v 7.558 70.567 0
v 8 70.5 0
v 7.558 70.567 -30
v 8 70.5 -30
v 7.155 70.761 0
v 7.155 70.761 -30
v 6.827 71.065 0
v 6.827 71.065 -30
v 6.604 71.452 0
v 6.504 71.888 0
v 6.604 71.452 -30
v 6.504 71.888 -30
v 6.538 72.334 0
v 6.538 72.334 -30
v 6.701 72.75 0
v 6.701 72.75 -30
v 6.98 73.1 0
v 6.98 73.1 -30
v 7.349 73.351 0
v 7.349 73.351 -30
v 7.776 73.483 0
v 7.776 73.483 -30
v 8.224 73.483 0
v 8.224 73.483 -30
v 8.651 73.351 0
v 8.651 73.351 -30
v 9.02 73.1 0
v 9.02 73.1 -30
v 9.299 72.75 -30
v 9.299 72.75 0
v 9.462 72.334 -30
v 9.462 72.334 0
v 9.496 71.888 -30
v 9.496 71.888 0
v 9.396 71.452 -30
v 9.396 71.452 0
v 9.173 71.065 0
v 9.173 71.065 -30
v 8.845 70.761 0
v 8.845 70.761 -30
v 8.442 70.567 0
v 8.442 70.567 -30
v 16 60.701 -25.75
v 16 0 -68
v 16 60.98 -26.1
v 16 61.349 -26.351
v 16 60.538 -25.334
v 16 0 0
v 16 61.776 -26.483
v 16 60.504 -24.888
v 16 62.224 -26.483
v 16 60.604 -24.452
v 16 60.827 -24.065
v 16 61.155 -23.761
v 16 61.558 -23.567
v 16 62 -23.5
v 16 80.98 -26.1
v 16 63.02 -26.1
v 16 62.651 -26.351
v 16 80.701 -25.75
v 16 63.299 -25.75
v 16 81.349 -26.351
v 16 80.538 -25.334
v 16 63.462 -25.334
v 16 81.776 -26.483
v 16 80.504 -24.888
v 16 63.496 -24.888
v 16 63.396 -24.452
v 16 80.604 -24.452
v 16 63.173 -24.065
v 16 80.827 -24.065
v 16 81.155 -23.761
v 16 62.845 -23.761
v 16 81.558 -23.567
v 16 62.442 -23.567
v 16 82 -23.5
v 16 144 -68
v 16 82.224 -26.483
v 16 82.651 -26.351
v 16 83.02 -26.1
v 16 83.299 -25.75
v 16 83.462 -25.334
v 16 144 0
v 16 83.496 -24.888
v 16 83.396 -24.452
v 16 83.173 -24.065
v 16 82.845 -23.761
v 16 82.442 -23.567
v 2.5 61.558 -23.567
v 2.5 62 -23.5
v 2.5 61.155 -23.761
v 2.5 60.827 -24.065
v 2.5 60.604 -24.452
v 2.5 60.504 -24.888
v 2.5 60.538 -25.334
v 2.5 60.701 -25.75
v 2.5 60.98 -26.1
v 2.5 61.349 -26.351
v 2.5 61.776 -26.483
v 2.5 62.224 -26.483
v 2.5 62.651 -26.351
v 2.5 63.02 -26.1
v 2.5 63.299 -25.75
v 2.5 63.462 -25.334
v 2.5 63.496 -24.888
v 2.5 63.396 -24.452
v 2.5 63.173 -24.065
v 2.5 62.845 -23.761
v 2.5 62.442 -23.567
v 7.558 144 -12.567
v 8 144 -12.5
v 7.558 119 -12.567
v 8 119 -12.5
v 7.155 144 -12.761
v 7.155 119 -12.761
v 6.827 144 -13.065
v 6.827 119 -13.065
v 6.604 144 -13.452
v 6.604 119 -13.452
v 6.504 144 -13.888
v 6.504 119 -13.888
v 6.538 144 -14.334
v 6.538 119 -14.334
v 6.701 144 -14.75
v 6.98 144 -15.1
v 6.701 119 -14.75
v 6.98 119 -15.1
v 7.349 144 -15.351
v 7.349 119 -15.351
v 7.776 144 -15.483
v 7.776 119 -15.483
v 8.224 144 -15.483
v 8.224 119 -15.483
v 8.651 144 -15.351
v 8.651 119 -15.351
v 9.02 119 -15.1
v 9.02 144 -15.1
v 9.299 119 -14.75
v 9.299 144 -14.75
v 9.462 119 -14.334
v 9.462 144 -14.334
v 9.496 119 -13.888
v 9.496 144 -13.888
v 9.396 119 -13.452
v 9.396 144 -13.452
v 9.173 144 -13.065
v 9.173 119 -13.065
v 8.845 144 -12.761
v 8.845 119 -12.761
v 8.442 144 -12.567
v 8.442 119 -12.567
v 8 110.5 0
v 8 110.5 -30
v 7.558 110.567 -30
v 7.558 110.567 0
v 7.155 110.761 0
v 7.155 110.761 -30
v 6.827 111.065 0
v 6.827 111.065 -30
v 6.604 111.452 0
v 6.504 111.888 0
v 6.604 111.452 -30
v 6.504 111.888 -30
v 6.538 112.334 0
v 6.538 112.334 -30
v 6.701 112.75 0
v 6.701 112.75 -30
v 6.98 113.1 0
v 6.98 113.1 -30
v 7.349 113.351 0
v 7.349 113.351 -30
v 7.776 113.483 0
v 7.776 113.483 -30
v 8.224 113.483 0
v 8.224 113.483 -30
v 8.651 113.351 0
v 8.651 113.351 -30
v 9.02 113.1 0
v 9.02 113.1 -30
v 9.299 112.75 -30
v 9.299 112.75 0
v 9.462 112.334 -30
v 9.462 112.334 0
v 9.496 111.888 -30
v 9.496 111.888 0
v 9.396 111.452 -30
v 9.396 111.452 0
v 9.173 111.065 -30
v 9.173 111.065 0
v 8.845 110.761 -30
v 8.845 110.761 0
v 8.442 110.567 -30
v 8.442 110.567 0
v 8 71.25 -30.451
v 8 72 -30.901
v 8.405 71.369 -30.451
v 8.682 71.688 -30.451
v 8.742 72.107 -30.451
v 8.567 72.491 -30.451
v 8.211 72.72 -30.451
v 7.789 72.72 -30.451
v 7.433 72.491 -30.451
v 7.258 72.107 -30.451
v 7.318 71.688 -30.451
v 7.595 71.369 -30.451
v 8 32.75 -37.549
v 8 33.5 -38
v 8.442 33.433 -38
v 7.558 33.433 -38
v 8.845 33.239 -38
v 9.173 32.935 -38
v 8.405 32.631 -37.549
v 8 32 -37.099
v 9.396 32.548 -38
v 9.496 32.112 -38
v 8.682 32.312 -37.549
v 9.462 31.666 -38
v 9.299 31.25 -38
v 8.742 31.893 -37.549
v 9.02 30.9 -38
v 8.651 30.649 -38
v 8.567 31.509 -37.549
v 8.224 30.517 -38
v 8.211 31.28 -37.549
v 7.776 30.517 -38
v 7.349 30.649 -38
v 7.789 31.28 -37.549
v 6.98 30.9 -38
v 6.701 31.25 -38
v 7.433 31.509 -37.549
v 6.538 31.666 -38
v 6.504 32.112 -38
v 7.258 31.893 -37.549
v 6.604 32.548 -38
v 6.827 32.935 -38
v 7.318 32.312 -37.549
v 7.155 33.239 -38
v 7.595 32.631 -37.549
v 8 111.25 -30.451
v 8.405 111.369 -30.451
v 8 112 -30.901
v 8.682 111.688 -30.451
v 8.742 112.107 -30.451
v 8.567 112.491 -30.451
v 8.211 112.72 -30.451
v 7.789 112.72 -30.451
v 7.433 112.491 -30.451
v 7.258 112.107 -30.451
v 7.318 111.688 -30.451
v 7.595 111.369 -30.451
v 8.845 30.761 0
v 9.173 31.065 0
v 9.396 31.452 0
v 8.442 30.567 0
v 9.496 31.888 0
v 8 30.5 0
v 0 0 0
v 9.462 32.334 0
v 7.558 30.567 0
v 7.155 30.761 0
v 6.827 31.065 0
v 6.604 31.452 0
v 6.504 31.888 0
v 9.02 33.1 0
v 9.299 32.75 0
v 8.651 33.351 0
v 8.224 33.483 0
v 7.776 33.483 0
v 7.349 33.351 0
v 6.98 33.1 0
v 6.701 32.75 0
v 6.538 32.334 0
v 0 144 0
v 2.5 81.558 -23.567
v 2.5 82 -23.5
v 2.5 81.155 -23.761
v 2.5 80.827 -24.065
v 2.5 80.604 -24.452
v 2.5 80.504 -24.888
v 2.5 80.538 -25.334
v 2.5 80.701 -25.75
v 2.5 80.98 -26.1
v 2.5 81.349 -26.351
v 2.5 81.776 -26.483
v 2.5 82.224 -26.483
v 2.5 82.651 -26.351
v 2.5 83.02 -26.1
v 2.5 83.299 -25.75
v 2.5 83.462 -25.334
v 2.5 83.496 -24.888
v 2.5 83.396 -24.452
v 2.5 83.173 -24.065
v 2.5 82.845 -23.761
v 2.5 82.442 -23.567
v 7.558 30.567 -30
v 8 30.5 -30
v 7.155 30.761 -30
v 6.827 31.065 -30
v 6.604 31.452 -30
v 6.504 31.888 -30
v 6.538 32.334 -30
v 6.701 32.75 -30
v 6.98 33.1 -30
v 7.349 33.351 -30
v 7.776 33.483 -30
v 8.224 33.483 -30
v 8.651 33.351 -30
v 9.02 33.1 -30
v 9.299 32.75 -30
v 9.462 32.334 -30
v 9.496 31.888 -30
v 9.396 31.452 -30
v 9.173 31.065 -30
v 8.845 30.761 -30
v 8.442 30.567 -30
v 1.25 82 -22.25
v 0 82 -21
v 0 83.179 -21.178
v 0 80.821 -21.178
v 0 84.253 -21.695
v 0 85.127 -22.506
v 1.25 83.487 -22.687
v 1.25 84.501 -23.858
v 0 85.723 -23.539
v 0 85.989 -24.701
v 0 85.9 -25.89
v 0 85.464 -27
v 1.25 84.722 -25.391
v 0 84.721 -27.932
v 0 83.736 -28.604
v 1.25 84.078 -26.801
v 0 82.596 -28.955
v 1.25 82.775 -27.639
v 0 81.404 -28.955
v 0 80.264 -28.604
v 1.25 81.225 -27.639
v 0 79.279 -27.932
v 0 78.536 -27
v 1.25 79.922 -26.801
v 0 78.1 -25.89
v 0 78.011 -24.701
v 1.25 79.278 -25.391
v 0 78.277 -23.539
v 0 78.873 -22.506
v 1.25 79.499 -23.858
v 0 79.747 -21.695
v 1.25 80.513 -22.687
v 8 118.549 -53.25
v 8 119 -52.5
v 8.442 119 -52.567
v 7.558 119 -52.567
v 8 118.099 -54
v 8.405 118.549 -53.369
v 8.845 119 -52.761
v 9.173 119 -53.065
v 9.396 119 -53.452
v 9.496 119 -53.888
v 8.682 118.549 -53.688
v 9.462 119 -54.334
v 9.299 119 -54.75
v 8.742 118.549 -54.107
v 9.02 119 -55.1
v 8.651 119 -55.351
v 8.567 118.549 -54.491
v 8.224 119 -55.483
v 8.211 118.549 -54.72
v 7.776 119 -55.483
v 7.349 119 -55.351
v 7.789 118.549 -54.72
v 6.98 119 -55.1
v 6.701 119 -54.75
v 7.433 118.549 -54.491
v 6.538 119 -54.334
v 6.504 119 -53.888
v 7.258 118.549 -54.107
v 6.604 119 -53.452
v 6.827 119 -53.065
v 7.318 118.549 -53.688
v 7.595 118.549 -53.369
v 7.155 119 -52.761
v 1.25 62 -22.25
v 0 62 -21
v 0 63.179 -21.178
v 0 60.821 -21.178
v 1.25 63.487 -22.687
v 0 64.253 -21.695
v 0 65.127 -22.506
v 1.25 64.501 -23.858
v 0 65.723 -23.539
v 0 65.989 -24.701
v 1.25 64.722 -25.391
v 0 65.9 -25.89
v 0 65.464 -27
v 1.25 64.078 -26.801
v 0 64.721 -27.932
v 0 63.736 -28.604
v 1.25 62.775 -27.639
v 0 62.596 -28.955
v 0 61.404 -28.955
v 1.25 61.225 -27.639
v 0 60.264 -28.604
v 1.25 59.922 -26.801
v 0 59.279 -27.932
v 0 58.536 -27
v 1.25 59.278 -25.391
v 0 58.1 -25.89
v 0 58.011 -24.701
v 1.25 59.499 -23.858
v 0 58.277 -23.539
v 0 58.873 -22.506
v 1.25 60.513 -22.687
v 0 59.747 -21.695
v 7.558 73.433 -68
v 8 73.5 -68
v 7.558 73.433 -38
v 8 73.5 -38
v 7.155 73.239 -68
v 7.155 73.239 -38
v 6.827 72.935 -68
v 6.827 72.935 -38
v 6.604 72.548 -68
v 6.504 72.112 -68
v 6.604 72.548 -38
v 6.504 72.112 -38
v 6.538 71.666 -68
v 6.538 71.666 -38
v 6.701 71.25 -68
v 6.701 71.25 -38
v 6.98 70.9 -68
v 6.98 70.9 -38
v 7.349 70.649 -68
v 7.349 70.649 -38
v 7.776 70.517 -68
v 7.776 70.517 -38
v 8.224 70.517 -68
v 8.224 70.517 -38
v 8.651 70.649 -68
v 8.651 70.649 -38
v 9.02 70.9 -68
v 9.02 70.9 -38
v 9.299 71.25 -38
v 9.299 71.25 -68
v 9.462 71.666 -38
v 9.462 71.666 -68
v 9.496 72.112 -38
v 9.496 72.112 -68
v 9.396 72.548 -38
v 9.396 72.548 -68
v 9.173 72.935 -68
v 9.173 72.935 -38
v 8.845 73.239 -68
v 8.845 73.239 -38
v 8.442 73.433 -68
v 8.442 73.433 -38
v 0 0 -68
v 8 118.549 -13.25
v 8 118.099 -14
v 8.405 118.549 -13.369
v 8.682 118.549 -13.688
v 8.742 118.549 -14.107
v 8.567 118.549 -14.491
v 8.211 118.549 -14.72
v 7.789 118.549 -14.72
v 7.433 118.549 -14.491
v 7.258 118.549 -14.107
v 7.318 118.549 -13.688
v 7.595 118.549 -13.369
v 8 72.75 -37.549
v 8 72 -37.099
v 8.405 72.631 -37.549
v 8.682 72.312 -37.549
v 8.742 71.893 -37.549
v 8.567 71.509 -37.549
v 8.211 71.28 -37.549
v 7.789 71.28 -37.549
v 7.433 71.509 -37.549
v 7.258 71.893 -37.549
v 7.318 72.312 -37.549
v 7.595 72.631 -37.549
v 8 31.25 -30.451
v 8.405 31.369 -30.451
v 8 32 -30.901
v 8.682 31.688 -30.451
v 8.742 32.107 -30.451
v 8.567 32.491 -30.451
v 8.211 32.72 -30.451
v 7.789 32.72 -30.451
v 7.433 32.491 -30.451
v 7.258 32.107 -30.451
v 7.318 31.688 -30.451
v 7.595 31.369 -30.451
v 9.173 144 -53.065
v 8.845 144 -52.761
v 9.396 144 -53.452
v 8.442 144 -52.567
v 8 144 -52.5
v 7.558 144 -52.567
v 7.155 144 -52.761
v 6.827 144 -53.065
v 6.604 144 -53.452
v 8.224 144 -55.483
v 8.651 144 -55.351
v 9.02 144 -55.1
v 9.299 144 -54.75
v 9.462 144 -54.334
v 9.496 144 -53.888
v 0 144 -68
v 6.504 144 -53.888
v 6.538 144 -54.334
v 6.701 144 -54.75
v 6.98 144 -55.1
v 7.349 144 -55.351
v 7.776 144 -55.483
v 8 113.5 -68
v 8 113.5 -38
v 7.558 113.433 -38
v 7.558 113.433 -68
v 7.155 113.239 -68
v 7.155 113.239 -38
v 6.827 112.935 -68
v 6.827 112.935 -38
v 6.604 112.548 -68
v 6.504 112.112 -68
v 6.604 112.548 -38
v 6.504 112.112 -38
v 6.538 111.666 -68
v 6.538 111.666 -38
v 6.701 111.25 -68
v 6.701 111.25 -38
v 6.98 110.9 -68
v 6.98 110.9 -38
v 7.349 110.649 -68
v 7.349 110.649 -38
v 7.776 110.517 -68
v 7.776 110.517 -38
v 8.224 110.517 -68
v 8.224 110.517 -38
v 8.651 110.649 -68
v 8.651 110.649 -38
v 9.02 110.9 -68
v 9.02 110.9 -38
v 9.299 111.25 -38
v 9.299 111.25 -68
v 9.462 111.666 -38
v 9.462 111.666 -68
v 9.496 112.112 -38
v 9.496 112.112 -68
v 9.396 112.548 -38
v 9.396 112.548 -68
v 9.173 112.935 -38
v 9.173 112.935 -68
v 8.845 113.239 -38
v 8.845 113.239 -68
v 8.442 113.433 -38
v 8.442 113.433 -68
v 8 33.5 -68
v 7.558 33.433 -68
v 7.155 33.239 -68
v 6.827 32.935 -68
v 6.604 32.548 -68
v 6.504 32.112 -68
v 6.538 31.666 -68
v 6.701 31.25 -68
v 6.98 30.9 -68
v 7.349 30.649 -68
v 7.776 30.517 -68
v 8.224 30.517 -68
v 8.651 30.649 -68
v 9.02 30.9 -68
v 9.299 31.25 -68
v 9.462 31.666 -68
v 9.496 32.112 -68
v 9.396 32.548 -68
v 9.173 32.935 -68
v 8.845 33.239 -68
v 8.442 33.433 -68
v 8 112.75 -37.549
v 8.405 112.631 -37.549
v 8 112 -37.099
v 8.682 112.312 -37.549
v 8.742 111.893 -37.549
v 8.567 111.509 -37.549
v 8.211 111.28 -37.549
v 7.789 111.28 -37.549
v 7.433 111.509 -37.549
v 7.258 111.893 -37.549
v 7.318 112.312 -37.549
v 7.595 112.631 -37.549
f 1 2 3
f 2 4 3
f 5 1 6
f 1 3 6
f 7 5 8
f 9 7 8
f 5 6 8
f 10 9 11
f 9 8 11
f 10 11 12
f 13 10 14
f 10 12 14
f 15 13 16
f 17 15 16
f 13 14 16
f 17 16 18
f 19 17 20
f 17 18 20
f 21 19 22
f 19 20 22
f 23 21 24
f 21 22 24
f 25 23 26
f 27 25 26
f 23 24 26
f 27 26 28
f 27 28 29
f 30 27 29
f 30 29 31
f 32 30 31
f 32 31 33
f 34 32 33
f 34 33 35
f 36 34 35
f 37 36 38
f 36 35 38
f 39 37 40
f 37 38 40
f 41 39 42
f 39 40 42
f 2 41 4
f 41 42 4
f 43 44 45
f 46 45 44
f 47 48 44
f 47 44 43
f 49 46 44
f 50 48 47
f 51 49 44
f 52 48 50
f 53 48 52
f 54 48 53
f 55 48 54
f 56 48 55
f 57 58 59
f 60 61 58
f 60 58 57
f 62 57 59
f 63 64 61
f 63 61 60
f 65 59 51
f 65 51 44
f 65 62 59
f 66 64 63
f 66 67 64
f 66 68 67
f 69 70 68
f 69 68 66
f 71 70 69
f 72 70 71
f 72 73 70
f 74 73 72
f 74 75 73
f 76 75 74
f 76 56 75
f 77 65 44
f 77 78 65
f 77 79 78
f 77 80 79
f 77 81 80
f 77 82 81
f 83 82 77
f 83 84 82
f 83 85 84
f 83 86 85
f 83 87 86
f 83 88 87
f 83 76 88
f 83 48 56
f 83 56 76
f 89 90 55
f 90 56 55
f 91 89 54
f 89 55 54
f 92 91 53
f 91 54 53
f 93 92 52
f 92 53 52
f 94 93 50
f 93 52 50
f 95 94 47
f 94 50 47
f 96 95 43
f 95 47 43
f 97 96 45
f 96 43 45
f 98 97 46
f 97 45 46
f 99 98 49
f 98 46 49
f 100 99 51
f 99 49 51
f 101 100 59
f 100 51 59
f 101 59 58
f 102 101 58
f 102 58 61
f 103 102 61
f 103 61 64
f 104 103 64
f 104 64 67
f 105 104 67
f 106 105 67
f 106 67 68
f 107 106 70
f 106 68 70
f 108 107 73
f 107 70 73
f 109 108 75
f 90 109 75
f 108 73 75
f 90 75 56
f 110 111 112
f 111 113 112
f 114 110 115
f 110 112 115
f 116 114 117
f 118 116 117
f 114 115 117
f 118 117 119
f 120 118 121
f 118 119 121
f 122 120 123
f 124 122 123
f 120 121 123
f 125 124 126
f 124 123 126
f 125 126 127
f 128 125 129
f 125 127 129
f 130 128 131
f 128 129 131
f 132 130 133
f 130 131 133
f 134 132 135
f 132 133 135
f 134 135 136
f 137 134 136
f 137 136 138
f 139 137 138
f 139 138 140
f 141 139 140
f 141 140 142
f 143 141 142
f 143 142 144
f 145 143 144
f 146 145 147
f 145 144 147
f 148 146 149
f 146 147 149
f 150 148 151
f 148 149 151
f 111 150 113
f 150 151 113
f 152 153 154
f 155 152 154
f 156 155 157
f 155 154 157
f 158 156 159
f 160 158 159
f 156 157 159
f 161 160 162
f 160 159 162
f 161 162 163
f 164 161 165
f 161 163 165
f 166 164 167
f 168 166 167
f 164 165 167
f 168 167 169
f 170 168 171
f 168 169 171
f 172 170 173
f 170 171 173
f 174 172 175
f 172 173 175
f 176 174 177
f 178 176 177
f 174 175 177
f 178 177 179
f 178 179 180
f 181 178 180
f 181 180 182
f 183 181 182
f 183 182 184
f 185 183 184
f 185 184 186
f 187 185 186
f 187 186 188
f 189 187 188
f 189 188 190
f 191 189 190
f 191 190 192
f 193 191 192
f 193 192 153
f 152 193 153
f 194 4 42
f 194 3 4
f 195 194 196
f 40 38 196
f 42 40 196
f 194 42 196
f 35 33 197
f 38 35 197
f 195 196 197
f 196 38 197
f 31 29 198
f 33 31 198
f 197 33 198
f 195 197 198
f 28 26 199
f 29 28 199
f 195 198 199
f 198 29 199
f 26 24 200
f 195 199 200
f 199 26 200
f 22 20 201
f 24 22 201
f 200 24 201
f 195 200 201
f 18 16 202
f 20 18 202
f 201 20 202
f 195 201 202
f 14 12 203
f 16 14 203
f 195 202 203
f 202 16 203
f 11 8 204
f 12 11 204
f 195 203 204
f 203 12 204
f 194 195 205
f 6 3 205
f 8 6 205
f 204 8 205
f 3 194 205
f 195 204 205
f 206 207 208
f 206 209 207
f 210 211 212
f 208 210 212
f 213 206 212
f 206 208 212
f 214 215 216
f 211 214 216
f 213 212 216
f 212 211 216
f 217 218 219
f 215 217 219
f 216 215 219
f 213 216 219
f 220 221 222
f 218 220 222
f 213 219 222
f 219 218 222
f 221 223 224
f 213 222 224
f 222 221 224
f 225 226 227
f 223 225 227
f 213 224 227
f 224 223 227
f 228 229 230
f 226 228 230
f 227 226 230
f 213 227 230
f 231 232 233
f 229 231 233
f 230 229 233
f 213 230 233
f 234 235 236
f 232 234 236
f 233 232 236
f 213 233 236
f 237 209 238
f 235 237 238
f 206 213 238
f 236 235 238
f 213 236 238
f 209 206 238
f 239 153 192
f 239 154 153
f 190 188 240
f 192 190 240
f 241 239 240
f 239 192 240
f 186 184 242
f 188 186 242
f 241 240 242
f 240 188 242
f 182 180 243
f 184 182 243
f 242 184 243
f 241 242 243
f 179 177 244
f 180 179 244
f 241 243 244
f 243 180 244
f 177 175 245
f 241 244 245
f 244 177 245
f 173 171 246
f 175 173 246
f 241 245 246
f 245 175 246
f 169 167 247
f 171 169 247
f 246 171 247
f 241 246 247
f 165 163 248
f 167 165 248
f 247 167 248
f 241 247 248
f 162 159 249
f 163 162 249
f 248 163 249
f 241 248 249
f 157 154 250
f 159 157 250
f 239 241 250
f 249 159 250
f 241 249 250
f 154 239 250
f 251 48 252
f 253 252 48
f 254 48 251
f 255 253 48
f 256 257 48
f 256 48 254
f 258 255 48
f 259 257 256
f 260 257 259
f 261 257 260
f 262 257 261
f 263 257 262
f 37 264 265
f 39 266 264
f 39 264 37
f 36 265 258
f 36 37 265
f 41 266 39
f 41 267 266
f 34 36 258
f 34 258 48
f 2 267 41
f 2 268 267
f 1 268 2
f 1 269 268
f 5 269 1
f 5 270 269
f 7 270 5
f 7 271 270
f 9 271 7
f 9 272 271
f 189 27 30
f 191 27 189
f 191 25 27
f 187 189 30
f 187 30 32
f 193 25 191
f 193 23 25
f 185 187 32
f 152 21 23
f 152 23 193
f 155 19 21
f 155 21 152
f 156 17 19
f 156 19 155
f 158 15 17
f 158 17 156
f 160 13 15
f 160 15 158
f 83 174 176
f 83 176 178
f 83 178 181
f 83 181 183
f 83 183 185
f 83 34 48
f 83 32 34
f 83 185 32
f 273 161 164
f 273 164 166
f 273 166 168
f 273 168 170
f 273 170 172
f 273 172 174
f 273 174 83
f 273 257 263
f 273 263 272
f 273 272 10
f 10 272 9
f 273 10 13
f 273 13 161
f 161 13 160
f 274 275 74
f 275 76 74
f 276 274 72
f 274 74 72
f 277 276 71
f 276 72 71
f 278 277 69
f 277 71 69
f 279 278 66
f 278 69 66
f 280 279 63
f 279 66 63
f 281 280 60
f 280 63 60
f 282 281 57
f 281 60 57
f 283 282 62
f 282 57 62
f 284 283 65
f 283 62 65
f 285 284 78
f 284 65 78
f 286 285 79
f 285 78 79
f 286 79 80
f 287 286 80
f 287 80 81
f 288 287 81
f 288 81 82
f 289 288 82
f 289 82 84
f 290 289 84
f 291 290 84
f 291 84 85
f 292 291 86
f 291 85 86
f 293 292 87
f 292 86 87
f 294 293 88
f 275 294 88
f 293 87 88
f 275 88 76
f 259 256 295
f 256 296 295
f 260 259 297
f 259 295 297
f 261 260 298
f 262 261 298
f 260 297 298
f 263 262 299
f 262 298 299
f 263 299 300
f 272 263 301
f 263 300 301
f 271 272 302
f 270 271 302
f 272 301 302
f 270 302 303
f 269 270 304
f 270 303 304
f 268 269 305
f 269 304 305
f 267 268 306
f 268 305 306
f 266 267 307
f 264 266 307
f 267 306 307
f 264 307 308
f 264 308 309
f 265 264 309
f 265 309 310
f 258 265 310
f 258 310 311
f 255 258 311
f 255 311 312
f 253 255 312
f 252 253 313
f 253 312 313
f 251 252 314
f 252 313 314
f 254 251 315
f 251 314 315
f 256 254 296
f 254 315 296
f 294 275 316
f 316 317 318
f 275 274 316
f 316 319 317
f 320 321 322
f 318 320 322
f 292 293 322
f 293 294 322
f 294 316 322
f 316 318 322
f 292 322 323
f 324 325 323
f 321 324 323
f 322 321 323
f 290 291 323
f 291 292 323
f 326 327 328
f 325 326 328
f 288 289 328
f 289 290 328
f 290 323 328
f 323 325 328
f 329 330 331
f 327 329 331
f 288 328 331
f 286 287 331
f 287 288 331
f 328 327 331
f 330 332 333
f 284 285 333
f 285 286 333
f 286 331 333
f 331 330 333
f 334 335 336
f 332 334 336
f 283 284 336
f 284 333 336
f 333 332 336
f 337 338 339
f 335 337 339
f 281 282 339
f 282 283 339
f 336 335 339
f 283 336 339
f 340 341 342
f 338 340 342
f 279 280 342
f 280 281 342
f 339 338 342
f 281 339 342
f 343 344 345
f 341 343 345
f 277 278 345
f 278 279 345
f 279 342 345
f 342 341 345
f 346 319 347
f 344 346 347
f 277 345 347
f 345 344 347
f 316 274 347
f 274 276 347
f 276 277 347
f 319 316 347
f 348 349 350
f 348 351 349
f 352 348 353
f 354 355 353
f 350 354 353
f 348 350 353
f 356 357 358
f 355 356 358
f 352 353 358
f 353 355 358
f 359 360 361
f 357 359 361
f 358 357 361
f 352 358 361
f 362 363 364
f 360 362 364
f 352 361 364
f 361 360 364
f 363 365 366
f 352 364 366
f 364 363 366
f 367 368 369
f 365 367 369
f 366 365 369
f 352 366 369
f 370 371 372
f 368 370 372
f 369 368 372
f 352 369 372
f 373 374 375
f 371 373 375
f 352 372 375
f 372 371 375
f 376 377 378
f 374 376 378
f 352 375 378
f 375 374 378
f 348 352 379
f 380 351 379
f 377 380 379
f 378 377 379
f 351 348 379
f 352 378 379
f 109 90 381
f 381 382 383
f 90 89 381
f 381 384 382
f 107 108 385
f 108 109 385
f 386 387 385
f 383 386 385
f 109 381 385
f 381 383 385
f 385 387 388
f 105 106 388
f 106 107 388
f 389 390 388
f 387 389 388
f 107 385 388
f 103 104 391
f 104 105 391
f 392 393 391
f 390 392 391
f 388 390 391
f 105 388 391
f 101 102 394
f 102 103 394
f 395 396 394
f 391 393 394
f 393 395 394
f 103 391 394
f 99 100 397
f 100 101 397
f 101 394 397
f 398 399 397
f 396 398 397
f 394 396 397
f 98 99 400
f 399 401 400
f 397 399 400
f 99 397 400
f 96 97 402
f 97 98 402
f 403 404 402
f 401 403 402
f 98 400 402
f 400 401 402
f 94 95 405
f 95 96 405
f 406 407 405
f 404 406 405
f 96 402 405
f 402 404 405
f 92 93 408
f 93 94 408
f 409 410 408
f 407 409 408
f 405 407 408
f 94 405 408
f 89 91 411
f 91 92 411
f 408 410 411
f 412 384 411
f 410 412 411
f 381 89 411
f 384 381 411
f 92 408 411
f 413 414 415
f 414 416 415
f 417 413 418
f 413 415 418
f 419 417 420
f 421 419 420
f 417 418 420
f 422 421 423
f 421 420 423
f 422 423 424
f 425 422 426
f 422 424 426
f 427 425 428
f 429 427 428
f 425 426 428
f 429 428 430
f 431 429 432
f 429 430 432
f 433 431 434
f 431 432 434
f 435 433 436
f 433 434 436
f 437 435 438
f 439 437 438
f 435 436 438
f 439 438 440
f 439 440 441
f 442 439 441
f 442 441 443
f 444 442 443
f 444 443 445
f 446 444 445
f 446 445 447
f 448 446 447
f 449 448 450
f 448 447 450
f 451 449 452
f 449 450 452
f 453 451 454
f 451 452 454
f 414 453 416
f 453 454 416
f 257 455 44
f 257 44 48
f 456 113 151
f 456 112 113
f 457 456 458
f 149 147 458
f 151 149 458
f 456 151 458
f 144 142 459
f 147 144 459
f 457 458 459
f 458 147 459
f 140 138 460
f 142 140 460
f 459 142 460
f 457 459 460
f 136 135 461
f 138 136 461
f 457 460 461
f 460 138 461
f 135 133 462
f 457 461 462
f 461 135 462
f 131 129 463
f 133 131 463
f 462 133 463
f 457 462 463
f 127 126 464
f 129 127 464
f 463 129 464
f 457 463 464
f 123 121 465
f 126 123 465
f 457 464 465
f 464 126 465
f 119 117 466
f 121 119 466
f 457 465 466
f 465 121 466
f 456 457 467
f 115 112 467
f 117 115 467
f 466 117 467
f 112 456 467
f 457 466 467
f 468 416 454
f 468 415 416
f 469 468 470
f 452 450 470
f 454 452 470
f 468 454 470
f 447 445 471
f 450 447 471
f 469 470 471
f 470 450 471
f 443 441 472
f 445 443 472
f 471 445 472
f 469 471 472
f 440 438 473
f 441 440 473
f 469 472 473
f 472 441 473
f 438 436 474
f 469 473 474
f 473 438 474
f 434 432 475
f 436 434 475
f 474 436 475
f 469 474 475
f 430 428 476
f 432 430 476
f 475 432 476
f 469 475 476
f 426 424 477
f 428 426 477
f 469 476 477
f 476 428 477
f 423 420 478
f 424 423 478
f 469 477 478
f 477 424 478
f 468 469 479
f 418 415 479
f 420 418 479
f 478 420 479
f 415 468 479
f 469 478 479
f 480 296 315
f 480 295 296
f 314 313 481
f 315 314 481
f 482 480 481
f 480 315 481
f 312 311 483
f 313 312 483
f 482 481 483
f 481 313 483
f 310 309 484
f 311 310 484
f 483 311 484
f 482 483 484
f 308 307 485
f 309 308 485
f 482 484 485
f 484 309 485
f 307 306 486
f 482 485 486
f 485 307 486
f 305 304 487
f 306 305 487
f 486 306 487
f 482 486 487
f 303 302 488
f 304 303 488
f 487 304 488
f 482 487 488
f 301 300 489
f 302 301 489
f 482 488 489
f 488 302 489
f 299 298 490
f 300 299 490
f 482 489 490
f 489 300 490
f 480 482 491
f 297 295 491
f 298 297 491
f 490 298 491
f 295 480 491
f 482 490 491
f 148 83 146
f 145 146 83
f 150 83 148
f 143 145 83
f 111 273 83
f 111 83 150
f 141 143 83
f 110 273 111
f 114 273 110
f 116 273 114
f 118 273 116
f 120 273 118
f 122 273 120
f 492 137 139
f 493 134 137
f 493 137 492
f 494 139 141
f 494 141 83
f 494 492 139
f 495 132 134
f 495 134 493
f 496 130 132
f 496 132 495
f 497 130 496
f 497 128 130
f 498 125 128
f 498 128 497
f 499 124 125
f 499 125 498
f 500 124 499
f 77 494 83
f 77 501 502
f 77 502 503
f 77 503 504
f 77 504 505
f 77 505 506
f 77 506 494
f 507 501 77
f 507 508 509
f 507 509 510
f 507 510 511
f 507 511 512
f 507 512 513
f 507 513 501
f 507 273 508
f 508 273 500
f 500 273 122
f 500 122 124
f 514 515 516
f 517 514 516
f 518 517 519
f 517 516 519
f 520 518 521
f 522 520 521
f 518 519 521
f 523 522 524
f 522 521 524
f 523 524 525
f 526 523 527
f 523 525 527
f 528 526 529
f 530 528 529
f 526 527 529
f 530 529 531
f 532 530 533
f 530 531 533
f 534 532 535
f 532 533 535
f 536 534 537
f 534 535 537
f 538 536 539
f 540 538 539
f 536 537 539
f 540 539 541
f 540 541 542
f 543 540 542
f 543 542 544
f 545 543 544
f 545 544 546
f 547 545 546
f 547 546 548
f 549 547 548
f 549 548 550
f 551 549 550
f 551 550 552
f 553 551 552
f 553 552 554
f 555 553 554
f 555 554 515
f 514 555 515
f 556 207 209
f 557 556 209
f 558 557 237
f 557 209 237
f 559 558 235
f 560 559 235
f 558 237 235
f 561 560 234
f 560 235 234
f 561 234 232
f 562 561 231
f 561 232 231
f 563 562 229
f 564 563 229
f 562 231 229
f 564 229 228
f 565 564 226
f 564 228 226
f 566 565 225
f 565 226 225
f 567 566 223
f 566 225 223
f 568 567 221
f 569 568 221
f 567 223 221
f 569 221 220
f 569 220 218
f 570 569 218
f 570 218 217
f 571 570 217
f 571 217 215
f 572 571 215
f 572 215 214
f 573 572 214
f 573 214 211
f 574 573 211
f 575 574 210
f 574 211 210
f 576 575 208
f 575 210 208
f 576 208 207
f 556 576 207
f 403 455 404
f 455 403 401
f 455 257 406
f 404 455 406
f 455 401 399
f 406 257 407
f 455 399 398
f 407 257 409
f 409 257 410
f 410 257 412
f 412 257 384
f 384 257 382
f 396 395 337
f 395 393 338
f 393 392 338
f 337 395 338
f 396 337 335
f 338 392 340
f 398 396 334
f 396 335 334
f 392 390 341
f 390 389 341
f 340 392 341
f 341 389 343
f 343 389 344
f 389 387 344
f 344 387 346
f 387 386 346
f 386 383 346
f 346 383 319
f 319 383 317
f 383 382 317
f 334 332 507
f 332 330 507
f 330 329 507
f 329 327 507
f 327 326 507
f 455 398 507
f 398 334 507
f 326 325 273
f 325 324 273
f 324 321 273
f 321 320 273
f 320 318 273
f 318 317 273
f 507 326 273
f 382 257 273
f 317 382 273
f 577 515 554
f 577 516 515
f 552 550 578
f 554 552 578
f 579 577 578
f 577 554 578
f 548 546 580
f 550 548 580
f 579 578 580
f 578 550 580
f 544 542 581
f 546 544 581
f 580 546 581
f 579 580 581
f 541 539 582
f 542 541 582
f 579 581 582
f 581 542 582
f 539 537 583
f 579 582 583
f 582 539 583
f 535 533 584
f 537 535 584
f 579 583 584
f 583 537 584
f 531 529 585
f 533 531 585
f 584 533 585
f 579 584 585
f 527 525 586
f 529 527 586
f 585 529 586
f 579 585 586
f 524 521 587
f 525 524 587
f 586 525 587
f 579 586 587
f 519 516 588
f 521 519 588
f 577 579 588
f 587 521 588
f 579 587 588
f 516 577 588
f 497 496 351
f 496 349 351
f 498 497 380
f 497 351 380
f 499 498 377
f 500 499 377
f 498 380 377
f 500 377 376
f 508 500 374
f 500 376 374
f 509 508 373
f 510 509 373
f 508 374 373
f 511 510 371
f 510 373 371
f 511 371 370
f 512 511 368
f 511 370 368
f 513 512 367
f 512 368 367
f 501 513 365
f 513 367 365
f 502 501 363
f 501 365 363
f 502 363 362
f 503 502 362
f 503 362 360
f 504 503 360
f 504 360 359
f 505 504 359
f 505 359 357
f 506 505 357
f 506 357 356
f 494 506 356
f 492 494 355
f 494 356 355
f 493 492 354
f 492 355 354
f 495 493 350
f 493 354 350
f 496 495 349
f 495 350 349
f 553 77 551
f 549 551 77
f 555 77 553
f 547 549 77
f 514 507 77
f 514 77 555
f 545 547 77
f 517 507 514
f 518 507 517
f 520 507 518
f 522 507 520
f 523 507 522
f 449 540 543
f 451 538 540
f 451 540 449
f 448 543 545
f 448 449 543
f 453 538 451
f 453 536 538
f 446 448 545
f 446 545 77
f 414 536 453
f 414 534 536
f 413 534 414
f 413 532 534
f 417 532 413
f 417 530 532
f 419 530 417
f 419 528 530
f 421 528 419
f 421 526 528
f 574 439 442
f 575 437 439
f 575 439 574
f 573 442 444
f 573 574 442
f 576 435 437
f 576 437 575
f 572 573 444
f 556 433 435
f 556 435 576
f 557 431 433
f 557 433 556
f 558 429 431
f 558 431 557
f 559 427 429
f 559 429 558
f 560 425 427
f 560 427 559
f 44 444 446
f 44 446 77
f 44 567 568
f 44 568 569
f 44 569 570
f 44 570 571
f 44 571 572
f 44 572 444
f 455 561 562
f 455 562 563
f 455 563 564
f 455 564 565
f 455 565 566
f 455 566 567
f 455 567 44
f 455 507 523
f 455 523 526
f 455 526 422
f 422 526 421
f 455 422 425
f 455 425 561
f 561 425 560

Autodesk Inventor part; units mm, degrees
ref_plane "YZ Plane" through (0, 0, 0) normal (1, 0, 0) x (0, 1, 0)
ref_plane "XZ Plane" through (0, 0, 0) normal (0, 1, 0) x (-1, 0, 0)
ref_plane "XY Plane" through (0, 0, 0) normal (0, 0, 1) x (1, 0, 0)
sketch "Skizze1" plane through (0, 0, 0) normal (1, 0, 0) x (0, 1, 0)
  line L0 (0, 0) -> (144, 0)
  line L1 (144, 0) -> (144, -68)
  line L2 (144, -68) -> (0, -68)
  line L3 (0, -68) -> (0, 0)
  dimension "d0" = 144
  dimension "d1" = 68
extrude "Extrusion1" add sketch "Skizze1" along normal blind 16
sketch "Skizze2" plane through (0, 0, 0) normal (0, 0, 1) x (1, 0, 0)
  line L0 (0, 0) -> (0, 144) construction
  line L1 (0, 72) -> (16, 72) construction
  line L2 (16, 144) -> (16, 0) construction
  line L3 (0, 144) -> (16, 144) construction
  line L4 (8, 144) -> (8, 0) construction
  line L5 (0, 144) -> (16, 144) construction
  line L6 (0, 0) -> (16, 0) construction
  line L7 (0, 144) -> (16, 144) construction
  line L8 (16, 144) -> (16, 0) construction
  line L9 (16, 0) -> (0, 0) construction
  line L10 (0, 0) -> (0, 144) construction
  line L11 (0, 112) -> (16, 112) construction
  line L12 (0, 32) -> (16, 32) construction
  point P0 (8, 112)
  point P1 (8, 72)
  point P2 (8, 32)
  dimension "d4" = 40
  dimension "d5" = 40
hole "Bohrung1" at (8, 112, 0) at (8, 72, 0) at (8, 32, 0) direction (0, 0, -1) diameter 3 depth 30 tip angle 118
sketch "Skizze3" plane through (0, 144, 0) normal (0, 1, 0) x (1, 0, 0)
  line L0 (0, 0) -> (16, 0)
  line L1 (16, 0) -> (16, 68)
  line L2 (16, 68) -> (0, 68)
  line L3 (0, 68) -> (0, 0)
  line L4 (8, 0) -> (8, 68) construction
  line L5 (0, 68) -> (16, 68) construction
  line L6 (16, 0) -> (16, 68) construction
  line L7 (16, 34) -> (0, 34) construction
  line L8 (0, 68) -> (0, 0) construction
  line L9 (0, 14) -> (16, 14) construction
  line L10 (0, 54) -> (16, 54) construction
  point P0 (8, 14)
  point P1 (8, 54)
  dimension "d13" = 14
  dimension "d22" = 14
hole "Bohrung2" at (8, 144, -14) at (8, 144, -54) direction (0, -1, 0) diameter 3 depth 25 tip angle 118
sketch "Skizze4" plane through (0, 0, -68) normal (0, 0, -1) x (-1, 0, 0)
  line L0 (0, 0) -> (-16, 0) construction
  line L1 (-16, 0) -> (-16, 144) construction
  line L2 (-16, 144) -> (0, 144) construction
  line L3 (0, 144) -> (0, 0) construction
  line L4 (-8, 0) -> (-8, 144) construction
  line L5 (-16, 144) -> (-16, 0) construction
  line L6 (-16, 72) -> (0, 72) construction
  circle A0 centre (-8, 72) radius 1.5 construction
  point P0 (-8, 112)
  point P1 (-8, 32)
  dimension "d23" = 40
  dimension "d24" = 40
hole "Bohrung3" at (8, 72, -68) at (8, 112, -68) at (8, 32, -68) direction (0, 0, 1) diameter 3 depth 30 tip angle 118
sketch "Skizze6" plane through (0, 0, 0) normal (-1, 0, 0) x (0, 0, 1)
  line L0 (0, 0) -> (-68, 0) construction
  line L1 (-68, 0) -> (-68, 144) construction
  line L2 (-68, 144) -> (0, 144) construction
  line L3 (0, 144) -> (0, 0) construction
  line L4 (0, 144) -> (0, 0) construction
  line L5 (0, 72) -> (-68, 72) construction
  line L6 (-68, 70.5) -> (-68, 73.5) construction
  line L7 (0, 0) -> (-68, 0) construction
  line L8 (-34, 0) -> (-34, 144) construction
  line L9 (0, 144) -> (-68, 144) construction
  line L10 (-25, 82) -> (-25, 62) construction
  point P0 (-25, 72)
  dimension "d41" = 25
  dimension "d42" = 10
hole "Bohrung5" at (0, 82, -25) at (0, 62, -25) direction (1, 0, 0) diameter 3 end through all countersink diameter 8 countersink angle 90
equation "\"d48\" = Stärke"
equation "\"Biegeradius\" = Stärke"
equation "\"BreiteBiegungsfreistellung\" = Stärke"
equation "\"TiefeBiegungsfreistellung\" = 0.5 * Stärke"
equation "\"GrößeEckenfreistellung\" = 4 * Stärke"
equation "\"MinimalRest\" = 2 * Stärke"
equation "\"Übergangsradius\" = Biegeradius"
equation "\"JacobiRadiusGröße\" = Biegeradius"
equation "\"Abstandsgröße\" = Stärke"
equation "\"Stärke\" = 0.5"
properties part number "licht_200_side_left"
